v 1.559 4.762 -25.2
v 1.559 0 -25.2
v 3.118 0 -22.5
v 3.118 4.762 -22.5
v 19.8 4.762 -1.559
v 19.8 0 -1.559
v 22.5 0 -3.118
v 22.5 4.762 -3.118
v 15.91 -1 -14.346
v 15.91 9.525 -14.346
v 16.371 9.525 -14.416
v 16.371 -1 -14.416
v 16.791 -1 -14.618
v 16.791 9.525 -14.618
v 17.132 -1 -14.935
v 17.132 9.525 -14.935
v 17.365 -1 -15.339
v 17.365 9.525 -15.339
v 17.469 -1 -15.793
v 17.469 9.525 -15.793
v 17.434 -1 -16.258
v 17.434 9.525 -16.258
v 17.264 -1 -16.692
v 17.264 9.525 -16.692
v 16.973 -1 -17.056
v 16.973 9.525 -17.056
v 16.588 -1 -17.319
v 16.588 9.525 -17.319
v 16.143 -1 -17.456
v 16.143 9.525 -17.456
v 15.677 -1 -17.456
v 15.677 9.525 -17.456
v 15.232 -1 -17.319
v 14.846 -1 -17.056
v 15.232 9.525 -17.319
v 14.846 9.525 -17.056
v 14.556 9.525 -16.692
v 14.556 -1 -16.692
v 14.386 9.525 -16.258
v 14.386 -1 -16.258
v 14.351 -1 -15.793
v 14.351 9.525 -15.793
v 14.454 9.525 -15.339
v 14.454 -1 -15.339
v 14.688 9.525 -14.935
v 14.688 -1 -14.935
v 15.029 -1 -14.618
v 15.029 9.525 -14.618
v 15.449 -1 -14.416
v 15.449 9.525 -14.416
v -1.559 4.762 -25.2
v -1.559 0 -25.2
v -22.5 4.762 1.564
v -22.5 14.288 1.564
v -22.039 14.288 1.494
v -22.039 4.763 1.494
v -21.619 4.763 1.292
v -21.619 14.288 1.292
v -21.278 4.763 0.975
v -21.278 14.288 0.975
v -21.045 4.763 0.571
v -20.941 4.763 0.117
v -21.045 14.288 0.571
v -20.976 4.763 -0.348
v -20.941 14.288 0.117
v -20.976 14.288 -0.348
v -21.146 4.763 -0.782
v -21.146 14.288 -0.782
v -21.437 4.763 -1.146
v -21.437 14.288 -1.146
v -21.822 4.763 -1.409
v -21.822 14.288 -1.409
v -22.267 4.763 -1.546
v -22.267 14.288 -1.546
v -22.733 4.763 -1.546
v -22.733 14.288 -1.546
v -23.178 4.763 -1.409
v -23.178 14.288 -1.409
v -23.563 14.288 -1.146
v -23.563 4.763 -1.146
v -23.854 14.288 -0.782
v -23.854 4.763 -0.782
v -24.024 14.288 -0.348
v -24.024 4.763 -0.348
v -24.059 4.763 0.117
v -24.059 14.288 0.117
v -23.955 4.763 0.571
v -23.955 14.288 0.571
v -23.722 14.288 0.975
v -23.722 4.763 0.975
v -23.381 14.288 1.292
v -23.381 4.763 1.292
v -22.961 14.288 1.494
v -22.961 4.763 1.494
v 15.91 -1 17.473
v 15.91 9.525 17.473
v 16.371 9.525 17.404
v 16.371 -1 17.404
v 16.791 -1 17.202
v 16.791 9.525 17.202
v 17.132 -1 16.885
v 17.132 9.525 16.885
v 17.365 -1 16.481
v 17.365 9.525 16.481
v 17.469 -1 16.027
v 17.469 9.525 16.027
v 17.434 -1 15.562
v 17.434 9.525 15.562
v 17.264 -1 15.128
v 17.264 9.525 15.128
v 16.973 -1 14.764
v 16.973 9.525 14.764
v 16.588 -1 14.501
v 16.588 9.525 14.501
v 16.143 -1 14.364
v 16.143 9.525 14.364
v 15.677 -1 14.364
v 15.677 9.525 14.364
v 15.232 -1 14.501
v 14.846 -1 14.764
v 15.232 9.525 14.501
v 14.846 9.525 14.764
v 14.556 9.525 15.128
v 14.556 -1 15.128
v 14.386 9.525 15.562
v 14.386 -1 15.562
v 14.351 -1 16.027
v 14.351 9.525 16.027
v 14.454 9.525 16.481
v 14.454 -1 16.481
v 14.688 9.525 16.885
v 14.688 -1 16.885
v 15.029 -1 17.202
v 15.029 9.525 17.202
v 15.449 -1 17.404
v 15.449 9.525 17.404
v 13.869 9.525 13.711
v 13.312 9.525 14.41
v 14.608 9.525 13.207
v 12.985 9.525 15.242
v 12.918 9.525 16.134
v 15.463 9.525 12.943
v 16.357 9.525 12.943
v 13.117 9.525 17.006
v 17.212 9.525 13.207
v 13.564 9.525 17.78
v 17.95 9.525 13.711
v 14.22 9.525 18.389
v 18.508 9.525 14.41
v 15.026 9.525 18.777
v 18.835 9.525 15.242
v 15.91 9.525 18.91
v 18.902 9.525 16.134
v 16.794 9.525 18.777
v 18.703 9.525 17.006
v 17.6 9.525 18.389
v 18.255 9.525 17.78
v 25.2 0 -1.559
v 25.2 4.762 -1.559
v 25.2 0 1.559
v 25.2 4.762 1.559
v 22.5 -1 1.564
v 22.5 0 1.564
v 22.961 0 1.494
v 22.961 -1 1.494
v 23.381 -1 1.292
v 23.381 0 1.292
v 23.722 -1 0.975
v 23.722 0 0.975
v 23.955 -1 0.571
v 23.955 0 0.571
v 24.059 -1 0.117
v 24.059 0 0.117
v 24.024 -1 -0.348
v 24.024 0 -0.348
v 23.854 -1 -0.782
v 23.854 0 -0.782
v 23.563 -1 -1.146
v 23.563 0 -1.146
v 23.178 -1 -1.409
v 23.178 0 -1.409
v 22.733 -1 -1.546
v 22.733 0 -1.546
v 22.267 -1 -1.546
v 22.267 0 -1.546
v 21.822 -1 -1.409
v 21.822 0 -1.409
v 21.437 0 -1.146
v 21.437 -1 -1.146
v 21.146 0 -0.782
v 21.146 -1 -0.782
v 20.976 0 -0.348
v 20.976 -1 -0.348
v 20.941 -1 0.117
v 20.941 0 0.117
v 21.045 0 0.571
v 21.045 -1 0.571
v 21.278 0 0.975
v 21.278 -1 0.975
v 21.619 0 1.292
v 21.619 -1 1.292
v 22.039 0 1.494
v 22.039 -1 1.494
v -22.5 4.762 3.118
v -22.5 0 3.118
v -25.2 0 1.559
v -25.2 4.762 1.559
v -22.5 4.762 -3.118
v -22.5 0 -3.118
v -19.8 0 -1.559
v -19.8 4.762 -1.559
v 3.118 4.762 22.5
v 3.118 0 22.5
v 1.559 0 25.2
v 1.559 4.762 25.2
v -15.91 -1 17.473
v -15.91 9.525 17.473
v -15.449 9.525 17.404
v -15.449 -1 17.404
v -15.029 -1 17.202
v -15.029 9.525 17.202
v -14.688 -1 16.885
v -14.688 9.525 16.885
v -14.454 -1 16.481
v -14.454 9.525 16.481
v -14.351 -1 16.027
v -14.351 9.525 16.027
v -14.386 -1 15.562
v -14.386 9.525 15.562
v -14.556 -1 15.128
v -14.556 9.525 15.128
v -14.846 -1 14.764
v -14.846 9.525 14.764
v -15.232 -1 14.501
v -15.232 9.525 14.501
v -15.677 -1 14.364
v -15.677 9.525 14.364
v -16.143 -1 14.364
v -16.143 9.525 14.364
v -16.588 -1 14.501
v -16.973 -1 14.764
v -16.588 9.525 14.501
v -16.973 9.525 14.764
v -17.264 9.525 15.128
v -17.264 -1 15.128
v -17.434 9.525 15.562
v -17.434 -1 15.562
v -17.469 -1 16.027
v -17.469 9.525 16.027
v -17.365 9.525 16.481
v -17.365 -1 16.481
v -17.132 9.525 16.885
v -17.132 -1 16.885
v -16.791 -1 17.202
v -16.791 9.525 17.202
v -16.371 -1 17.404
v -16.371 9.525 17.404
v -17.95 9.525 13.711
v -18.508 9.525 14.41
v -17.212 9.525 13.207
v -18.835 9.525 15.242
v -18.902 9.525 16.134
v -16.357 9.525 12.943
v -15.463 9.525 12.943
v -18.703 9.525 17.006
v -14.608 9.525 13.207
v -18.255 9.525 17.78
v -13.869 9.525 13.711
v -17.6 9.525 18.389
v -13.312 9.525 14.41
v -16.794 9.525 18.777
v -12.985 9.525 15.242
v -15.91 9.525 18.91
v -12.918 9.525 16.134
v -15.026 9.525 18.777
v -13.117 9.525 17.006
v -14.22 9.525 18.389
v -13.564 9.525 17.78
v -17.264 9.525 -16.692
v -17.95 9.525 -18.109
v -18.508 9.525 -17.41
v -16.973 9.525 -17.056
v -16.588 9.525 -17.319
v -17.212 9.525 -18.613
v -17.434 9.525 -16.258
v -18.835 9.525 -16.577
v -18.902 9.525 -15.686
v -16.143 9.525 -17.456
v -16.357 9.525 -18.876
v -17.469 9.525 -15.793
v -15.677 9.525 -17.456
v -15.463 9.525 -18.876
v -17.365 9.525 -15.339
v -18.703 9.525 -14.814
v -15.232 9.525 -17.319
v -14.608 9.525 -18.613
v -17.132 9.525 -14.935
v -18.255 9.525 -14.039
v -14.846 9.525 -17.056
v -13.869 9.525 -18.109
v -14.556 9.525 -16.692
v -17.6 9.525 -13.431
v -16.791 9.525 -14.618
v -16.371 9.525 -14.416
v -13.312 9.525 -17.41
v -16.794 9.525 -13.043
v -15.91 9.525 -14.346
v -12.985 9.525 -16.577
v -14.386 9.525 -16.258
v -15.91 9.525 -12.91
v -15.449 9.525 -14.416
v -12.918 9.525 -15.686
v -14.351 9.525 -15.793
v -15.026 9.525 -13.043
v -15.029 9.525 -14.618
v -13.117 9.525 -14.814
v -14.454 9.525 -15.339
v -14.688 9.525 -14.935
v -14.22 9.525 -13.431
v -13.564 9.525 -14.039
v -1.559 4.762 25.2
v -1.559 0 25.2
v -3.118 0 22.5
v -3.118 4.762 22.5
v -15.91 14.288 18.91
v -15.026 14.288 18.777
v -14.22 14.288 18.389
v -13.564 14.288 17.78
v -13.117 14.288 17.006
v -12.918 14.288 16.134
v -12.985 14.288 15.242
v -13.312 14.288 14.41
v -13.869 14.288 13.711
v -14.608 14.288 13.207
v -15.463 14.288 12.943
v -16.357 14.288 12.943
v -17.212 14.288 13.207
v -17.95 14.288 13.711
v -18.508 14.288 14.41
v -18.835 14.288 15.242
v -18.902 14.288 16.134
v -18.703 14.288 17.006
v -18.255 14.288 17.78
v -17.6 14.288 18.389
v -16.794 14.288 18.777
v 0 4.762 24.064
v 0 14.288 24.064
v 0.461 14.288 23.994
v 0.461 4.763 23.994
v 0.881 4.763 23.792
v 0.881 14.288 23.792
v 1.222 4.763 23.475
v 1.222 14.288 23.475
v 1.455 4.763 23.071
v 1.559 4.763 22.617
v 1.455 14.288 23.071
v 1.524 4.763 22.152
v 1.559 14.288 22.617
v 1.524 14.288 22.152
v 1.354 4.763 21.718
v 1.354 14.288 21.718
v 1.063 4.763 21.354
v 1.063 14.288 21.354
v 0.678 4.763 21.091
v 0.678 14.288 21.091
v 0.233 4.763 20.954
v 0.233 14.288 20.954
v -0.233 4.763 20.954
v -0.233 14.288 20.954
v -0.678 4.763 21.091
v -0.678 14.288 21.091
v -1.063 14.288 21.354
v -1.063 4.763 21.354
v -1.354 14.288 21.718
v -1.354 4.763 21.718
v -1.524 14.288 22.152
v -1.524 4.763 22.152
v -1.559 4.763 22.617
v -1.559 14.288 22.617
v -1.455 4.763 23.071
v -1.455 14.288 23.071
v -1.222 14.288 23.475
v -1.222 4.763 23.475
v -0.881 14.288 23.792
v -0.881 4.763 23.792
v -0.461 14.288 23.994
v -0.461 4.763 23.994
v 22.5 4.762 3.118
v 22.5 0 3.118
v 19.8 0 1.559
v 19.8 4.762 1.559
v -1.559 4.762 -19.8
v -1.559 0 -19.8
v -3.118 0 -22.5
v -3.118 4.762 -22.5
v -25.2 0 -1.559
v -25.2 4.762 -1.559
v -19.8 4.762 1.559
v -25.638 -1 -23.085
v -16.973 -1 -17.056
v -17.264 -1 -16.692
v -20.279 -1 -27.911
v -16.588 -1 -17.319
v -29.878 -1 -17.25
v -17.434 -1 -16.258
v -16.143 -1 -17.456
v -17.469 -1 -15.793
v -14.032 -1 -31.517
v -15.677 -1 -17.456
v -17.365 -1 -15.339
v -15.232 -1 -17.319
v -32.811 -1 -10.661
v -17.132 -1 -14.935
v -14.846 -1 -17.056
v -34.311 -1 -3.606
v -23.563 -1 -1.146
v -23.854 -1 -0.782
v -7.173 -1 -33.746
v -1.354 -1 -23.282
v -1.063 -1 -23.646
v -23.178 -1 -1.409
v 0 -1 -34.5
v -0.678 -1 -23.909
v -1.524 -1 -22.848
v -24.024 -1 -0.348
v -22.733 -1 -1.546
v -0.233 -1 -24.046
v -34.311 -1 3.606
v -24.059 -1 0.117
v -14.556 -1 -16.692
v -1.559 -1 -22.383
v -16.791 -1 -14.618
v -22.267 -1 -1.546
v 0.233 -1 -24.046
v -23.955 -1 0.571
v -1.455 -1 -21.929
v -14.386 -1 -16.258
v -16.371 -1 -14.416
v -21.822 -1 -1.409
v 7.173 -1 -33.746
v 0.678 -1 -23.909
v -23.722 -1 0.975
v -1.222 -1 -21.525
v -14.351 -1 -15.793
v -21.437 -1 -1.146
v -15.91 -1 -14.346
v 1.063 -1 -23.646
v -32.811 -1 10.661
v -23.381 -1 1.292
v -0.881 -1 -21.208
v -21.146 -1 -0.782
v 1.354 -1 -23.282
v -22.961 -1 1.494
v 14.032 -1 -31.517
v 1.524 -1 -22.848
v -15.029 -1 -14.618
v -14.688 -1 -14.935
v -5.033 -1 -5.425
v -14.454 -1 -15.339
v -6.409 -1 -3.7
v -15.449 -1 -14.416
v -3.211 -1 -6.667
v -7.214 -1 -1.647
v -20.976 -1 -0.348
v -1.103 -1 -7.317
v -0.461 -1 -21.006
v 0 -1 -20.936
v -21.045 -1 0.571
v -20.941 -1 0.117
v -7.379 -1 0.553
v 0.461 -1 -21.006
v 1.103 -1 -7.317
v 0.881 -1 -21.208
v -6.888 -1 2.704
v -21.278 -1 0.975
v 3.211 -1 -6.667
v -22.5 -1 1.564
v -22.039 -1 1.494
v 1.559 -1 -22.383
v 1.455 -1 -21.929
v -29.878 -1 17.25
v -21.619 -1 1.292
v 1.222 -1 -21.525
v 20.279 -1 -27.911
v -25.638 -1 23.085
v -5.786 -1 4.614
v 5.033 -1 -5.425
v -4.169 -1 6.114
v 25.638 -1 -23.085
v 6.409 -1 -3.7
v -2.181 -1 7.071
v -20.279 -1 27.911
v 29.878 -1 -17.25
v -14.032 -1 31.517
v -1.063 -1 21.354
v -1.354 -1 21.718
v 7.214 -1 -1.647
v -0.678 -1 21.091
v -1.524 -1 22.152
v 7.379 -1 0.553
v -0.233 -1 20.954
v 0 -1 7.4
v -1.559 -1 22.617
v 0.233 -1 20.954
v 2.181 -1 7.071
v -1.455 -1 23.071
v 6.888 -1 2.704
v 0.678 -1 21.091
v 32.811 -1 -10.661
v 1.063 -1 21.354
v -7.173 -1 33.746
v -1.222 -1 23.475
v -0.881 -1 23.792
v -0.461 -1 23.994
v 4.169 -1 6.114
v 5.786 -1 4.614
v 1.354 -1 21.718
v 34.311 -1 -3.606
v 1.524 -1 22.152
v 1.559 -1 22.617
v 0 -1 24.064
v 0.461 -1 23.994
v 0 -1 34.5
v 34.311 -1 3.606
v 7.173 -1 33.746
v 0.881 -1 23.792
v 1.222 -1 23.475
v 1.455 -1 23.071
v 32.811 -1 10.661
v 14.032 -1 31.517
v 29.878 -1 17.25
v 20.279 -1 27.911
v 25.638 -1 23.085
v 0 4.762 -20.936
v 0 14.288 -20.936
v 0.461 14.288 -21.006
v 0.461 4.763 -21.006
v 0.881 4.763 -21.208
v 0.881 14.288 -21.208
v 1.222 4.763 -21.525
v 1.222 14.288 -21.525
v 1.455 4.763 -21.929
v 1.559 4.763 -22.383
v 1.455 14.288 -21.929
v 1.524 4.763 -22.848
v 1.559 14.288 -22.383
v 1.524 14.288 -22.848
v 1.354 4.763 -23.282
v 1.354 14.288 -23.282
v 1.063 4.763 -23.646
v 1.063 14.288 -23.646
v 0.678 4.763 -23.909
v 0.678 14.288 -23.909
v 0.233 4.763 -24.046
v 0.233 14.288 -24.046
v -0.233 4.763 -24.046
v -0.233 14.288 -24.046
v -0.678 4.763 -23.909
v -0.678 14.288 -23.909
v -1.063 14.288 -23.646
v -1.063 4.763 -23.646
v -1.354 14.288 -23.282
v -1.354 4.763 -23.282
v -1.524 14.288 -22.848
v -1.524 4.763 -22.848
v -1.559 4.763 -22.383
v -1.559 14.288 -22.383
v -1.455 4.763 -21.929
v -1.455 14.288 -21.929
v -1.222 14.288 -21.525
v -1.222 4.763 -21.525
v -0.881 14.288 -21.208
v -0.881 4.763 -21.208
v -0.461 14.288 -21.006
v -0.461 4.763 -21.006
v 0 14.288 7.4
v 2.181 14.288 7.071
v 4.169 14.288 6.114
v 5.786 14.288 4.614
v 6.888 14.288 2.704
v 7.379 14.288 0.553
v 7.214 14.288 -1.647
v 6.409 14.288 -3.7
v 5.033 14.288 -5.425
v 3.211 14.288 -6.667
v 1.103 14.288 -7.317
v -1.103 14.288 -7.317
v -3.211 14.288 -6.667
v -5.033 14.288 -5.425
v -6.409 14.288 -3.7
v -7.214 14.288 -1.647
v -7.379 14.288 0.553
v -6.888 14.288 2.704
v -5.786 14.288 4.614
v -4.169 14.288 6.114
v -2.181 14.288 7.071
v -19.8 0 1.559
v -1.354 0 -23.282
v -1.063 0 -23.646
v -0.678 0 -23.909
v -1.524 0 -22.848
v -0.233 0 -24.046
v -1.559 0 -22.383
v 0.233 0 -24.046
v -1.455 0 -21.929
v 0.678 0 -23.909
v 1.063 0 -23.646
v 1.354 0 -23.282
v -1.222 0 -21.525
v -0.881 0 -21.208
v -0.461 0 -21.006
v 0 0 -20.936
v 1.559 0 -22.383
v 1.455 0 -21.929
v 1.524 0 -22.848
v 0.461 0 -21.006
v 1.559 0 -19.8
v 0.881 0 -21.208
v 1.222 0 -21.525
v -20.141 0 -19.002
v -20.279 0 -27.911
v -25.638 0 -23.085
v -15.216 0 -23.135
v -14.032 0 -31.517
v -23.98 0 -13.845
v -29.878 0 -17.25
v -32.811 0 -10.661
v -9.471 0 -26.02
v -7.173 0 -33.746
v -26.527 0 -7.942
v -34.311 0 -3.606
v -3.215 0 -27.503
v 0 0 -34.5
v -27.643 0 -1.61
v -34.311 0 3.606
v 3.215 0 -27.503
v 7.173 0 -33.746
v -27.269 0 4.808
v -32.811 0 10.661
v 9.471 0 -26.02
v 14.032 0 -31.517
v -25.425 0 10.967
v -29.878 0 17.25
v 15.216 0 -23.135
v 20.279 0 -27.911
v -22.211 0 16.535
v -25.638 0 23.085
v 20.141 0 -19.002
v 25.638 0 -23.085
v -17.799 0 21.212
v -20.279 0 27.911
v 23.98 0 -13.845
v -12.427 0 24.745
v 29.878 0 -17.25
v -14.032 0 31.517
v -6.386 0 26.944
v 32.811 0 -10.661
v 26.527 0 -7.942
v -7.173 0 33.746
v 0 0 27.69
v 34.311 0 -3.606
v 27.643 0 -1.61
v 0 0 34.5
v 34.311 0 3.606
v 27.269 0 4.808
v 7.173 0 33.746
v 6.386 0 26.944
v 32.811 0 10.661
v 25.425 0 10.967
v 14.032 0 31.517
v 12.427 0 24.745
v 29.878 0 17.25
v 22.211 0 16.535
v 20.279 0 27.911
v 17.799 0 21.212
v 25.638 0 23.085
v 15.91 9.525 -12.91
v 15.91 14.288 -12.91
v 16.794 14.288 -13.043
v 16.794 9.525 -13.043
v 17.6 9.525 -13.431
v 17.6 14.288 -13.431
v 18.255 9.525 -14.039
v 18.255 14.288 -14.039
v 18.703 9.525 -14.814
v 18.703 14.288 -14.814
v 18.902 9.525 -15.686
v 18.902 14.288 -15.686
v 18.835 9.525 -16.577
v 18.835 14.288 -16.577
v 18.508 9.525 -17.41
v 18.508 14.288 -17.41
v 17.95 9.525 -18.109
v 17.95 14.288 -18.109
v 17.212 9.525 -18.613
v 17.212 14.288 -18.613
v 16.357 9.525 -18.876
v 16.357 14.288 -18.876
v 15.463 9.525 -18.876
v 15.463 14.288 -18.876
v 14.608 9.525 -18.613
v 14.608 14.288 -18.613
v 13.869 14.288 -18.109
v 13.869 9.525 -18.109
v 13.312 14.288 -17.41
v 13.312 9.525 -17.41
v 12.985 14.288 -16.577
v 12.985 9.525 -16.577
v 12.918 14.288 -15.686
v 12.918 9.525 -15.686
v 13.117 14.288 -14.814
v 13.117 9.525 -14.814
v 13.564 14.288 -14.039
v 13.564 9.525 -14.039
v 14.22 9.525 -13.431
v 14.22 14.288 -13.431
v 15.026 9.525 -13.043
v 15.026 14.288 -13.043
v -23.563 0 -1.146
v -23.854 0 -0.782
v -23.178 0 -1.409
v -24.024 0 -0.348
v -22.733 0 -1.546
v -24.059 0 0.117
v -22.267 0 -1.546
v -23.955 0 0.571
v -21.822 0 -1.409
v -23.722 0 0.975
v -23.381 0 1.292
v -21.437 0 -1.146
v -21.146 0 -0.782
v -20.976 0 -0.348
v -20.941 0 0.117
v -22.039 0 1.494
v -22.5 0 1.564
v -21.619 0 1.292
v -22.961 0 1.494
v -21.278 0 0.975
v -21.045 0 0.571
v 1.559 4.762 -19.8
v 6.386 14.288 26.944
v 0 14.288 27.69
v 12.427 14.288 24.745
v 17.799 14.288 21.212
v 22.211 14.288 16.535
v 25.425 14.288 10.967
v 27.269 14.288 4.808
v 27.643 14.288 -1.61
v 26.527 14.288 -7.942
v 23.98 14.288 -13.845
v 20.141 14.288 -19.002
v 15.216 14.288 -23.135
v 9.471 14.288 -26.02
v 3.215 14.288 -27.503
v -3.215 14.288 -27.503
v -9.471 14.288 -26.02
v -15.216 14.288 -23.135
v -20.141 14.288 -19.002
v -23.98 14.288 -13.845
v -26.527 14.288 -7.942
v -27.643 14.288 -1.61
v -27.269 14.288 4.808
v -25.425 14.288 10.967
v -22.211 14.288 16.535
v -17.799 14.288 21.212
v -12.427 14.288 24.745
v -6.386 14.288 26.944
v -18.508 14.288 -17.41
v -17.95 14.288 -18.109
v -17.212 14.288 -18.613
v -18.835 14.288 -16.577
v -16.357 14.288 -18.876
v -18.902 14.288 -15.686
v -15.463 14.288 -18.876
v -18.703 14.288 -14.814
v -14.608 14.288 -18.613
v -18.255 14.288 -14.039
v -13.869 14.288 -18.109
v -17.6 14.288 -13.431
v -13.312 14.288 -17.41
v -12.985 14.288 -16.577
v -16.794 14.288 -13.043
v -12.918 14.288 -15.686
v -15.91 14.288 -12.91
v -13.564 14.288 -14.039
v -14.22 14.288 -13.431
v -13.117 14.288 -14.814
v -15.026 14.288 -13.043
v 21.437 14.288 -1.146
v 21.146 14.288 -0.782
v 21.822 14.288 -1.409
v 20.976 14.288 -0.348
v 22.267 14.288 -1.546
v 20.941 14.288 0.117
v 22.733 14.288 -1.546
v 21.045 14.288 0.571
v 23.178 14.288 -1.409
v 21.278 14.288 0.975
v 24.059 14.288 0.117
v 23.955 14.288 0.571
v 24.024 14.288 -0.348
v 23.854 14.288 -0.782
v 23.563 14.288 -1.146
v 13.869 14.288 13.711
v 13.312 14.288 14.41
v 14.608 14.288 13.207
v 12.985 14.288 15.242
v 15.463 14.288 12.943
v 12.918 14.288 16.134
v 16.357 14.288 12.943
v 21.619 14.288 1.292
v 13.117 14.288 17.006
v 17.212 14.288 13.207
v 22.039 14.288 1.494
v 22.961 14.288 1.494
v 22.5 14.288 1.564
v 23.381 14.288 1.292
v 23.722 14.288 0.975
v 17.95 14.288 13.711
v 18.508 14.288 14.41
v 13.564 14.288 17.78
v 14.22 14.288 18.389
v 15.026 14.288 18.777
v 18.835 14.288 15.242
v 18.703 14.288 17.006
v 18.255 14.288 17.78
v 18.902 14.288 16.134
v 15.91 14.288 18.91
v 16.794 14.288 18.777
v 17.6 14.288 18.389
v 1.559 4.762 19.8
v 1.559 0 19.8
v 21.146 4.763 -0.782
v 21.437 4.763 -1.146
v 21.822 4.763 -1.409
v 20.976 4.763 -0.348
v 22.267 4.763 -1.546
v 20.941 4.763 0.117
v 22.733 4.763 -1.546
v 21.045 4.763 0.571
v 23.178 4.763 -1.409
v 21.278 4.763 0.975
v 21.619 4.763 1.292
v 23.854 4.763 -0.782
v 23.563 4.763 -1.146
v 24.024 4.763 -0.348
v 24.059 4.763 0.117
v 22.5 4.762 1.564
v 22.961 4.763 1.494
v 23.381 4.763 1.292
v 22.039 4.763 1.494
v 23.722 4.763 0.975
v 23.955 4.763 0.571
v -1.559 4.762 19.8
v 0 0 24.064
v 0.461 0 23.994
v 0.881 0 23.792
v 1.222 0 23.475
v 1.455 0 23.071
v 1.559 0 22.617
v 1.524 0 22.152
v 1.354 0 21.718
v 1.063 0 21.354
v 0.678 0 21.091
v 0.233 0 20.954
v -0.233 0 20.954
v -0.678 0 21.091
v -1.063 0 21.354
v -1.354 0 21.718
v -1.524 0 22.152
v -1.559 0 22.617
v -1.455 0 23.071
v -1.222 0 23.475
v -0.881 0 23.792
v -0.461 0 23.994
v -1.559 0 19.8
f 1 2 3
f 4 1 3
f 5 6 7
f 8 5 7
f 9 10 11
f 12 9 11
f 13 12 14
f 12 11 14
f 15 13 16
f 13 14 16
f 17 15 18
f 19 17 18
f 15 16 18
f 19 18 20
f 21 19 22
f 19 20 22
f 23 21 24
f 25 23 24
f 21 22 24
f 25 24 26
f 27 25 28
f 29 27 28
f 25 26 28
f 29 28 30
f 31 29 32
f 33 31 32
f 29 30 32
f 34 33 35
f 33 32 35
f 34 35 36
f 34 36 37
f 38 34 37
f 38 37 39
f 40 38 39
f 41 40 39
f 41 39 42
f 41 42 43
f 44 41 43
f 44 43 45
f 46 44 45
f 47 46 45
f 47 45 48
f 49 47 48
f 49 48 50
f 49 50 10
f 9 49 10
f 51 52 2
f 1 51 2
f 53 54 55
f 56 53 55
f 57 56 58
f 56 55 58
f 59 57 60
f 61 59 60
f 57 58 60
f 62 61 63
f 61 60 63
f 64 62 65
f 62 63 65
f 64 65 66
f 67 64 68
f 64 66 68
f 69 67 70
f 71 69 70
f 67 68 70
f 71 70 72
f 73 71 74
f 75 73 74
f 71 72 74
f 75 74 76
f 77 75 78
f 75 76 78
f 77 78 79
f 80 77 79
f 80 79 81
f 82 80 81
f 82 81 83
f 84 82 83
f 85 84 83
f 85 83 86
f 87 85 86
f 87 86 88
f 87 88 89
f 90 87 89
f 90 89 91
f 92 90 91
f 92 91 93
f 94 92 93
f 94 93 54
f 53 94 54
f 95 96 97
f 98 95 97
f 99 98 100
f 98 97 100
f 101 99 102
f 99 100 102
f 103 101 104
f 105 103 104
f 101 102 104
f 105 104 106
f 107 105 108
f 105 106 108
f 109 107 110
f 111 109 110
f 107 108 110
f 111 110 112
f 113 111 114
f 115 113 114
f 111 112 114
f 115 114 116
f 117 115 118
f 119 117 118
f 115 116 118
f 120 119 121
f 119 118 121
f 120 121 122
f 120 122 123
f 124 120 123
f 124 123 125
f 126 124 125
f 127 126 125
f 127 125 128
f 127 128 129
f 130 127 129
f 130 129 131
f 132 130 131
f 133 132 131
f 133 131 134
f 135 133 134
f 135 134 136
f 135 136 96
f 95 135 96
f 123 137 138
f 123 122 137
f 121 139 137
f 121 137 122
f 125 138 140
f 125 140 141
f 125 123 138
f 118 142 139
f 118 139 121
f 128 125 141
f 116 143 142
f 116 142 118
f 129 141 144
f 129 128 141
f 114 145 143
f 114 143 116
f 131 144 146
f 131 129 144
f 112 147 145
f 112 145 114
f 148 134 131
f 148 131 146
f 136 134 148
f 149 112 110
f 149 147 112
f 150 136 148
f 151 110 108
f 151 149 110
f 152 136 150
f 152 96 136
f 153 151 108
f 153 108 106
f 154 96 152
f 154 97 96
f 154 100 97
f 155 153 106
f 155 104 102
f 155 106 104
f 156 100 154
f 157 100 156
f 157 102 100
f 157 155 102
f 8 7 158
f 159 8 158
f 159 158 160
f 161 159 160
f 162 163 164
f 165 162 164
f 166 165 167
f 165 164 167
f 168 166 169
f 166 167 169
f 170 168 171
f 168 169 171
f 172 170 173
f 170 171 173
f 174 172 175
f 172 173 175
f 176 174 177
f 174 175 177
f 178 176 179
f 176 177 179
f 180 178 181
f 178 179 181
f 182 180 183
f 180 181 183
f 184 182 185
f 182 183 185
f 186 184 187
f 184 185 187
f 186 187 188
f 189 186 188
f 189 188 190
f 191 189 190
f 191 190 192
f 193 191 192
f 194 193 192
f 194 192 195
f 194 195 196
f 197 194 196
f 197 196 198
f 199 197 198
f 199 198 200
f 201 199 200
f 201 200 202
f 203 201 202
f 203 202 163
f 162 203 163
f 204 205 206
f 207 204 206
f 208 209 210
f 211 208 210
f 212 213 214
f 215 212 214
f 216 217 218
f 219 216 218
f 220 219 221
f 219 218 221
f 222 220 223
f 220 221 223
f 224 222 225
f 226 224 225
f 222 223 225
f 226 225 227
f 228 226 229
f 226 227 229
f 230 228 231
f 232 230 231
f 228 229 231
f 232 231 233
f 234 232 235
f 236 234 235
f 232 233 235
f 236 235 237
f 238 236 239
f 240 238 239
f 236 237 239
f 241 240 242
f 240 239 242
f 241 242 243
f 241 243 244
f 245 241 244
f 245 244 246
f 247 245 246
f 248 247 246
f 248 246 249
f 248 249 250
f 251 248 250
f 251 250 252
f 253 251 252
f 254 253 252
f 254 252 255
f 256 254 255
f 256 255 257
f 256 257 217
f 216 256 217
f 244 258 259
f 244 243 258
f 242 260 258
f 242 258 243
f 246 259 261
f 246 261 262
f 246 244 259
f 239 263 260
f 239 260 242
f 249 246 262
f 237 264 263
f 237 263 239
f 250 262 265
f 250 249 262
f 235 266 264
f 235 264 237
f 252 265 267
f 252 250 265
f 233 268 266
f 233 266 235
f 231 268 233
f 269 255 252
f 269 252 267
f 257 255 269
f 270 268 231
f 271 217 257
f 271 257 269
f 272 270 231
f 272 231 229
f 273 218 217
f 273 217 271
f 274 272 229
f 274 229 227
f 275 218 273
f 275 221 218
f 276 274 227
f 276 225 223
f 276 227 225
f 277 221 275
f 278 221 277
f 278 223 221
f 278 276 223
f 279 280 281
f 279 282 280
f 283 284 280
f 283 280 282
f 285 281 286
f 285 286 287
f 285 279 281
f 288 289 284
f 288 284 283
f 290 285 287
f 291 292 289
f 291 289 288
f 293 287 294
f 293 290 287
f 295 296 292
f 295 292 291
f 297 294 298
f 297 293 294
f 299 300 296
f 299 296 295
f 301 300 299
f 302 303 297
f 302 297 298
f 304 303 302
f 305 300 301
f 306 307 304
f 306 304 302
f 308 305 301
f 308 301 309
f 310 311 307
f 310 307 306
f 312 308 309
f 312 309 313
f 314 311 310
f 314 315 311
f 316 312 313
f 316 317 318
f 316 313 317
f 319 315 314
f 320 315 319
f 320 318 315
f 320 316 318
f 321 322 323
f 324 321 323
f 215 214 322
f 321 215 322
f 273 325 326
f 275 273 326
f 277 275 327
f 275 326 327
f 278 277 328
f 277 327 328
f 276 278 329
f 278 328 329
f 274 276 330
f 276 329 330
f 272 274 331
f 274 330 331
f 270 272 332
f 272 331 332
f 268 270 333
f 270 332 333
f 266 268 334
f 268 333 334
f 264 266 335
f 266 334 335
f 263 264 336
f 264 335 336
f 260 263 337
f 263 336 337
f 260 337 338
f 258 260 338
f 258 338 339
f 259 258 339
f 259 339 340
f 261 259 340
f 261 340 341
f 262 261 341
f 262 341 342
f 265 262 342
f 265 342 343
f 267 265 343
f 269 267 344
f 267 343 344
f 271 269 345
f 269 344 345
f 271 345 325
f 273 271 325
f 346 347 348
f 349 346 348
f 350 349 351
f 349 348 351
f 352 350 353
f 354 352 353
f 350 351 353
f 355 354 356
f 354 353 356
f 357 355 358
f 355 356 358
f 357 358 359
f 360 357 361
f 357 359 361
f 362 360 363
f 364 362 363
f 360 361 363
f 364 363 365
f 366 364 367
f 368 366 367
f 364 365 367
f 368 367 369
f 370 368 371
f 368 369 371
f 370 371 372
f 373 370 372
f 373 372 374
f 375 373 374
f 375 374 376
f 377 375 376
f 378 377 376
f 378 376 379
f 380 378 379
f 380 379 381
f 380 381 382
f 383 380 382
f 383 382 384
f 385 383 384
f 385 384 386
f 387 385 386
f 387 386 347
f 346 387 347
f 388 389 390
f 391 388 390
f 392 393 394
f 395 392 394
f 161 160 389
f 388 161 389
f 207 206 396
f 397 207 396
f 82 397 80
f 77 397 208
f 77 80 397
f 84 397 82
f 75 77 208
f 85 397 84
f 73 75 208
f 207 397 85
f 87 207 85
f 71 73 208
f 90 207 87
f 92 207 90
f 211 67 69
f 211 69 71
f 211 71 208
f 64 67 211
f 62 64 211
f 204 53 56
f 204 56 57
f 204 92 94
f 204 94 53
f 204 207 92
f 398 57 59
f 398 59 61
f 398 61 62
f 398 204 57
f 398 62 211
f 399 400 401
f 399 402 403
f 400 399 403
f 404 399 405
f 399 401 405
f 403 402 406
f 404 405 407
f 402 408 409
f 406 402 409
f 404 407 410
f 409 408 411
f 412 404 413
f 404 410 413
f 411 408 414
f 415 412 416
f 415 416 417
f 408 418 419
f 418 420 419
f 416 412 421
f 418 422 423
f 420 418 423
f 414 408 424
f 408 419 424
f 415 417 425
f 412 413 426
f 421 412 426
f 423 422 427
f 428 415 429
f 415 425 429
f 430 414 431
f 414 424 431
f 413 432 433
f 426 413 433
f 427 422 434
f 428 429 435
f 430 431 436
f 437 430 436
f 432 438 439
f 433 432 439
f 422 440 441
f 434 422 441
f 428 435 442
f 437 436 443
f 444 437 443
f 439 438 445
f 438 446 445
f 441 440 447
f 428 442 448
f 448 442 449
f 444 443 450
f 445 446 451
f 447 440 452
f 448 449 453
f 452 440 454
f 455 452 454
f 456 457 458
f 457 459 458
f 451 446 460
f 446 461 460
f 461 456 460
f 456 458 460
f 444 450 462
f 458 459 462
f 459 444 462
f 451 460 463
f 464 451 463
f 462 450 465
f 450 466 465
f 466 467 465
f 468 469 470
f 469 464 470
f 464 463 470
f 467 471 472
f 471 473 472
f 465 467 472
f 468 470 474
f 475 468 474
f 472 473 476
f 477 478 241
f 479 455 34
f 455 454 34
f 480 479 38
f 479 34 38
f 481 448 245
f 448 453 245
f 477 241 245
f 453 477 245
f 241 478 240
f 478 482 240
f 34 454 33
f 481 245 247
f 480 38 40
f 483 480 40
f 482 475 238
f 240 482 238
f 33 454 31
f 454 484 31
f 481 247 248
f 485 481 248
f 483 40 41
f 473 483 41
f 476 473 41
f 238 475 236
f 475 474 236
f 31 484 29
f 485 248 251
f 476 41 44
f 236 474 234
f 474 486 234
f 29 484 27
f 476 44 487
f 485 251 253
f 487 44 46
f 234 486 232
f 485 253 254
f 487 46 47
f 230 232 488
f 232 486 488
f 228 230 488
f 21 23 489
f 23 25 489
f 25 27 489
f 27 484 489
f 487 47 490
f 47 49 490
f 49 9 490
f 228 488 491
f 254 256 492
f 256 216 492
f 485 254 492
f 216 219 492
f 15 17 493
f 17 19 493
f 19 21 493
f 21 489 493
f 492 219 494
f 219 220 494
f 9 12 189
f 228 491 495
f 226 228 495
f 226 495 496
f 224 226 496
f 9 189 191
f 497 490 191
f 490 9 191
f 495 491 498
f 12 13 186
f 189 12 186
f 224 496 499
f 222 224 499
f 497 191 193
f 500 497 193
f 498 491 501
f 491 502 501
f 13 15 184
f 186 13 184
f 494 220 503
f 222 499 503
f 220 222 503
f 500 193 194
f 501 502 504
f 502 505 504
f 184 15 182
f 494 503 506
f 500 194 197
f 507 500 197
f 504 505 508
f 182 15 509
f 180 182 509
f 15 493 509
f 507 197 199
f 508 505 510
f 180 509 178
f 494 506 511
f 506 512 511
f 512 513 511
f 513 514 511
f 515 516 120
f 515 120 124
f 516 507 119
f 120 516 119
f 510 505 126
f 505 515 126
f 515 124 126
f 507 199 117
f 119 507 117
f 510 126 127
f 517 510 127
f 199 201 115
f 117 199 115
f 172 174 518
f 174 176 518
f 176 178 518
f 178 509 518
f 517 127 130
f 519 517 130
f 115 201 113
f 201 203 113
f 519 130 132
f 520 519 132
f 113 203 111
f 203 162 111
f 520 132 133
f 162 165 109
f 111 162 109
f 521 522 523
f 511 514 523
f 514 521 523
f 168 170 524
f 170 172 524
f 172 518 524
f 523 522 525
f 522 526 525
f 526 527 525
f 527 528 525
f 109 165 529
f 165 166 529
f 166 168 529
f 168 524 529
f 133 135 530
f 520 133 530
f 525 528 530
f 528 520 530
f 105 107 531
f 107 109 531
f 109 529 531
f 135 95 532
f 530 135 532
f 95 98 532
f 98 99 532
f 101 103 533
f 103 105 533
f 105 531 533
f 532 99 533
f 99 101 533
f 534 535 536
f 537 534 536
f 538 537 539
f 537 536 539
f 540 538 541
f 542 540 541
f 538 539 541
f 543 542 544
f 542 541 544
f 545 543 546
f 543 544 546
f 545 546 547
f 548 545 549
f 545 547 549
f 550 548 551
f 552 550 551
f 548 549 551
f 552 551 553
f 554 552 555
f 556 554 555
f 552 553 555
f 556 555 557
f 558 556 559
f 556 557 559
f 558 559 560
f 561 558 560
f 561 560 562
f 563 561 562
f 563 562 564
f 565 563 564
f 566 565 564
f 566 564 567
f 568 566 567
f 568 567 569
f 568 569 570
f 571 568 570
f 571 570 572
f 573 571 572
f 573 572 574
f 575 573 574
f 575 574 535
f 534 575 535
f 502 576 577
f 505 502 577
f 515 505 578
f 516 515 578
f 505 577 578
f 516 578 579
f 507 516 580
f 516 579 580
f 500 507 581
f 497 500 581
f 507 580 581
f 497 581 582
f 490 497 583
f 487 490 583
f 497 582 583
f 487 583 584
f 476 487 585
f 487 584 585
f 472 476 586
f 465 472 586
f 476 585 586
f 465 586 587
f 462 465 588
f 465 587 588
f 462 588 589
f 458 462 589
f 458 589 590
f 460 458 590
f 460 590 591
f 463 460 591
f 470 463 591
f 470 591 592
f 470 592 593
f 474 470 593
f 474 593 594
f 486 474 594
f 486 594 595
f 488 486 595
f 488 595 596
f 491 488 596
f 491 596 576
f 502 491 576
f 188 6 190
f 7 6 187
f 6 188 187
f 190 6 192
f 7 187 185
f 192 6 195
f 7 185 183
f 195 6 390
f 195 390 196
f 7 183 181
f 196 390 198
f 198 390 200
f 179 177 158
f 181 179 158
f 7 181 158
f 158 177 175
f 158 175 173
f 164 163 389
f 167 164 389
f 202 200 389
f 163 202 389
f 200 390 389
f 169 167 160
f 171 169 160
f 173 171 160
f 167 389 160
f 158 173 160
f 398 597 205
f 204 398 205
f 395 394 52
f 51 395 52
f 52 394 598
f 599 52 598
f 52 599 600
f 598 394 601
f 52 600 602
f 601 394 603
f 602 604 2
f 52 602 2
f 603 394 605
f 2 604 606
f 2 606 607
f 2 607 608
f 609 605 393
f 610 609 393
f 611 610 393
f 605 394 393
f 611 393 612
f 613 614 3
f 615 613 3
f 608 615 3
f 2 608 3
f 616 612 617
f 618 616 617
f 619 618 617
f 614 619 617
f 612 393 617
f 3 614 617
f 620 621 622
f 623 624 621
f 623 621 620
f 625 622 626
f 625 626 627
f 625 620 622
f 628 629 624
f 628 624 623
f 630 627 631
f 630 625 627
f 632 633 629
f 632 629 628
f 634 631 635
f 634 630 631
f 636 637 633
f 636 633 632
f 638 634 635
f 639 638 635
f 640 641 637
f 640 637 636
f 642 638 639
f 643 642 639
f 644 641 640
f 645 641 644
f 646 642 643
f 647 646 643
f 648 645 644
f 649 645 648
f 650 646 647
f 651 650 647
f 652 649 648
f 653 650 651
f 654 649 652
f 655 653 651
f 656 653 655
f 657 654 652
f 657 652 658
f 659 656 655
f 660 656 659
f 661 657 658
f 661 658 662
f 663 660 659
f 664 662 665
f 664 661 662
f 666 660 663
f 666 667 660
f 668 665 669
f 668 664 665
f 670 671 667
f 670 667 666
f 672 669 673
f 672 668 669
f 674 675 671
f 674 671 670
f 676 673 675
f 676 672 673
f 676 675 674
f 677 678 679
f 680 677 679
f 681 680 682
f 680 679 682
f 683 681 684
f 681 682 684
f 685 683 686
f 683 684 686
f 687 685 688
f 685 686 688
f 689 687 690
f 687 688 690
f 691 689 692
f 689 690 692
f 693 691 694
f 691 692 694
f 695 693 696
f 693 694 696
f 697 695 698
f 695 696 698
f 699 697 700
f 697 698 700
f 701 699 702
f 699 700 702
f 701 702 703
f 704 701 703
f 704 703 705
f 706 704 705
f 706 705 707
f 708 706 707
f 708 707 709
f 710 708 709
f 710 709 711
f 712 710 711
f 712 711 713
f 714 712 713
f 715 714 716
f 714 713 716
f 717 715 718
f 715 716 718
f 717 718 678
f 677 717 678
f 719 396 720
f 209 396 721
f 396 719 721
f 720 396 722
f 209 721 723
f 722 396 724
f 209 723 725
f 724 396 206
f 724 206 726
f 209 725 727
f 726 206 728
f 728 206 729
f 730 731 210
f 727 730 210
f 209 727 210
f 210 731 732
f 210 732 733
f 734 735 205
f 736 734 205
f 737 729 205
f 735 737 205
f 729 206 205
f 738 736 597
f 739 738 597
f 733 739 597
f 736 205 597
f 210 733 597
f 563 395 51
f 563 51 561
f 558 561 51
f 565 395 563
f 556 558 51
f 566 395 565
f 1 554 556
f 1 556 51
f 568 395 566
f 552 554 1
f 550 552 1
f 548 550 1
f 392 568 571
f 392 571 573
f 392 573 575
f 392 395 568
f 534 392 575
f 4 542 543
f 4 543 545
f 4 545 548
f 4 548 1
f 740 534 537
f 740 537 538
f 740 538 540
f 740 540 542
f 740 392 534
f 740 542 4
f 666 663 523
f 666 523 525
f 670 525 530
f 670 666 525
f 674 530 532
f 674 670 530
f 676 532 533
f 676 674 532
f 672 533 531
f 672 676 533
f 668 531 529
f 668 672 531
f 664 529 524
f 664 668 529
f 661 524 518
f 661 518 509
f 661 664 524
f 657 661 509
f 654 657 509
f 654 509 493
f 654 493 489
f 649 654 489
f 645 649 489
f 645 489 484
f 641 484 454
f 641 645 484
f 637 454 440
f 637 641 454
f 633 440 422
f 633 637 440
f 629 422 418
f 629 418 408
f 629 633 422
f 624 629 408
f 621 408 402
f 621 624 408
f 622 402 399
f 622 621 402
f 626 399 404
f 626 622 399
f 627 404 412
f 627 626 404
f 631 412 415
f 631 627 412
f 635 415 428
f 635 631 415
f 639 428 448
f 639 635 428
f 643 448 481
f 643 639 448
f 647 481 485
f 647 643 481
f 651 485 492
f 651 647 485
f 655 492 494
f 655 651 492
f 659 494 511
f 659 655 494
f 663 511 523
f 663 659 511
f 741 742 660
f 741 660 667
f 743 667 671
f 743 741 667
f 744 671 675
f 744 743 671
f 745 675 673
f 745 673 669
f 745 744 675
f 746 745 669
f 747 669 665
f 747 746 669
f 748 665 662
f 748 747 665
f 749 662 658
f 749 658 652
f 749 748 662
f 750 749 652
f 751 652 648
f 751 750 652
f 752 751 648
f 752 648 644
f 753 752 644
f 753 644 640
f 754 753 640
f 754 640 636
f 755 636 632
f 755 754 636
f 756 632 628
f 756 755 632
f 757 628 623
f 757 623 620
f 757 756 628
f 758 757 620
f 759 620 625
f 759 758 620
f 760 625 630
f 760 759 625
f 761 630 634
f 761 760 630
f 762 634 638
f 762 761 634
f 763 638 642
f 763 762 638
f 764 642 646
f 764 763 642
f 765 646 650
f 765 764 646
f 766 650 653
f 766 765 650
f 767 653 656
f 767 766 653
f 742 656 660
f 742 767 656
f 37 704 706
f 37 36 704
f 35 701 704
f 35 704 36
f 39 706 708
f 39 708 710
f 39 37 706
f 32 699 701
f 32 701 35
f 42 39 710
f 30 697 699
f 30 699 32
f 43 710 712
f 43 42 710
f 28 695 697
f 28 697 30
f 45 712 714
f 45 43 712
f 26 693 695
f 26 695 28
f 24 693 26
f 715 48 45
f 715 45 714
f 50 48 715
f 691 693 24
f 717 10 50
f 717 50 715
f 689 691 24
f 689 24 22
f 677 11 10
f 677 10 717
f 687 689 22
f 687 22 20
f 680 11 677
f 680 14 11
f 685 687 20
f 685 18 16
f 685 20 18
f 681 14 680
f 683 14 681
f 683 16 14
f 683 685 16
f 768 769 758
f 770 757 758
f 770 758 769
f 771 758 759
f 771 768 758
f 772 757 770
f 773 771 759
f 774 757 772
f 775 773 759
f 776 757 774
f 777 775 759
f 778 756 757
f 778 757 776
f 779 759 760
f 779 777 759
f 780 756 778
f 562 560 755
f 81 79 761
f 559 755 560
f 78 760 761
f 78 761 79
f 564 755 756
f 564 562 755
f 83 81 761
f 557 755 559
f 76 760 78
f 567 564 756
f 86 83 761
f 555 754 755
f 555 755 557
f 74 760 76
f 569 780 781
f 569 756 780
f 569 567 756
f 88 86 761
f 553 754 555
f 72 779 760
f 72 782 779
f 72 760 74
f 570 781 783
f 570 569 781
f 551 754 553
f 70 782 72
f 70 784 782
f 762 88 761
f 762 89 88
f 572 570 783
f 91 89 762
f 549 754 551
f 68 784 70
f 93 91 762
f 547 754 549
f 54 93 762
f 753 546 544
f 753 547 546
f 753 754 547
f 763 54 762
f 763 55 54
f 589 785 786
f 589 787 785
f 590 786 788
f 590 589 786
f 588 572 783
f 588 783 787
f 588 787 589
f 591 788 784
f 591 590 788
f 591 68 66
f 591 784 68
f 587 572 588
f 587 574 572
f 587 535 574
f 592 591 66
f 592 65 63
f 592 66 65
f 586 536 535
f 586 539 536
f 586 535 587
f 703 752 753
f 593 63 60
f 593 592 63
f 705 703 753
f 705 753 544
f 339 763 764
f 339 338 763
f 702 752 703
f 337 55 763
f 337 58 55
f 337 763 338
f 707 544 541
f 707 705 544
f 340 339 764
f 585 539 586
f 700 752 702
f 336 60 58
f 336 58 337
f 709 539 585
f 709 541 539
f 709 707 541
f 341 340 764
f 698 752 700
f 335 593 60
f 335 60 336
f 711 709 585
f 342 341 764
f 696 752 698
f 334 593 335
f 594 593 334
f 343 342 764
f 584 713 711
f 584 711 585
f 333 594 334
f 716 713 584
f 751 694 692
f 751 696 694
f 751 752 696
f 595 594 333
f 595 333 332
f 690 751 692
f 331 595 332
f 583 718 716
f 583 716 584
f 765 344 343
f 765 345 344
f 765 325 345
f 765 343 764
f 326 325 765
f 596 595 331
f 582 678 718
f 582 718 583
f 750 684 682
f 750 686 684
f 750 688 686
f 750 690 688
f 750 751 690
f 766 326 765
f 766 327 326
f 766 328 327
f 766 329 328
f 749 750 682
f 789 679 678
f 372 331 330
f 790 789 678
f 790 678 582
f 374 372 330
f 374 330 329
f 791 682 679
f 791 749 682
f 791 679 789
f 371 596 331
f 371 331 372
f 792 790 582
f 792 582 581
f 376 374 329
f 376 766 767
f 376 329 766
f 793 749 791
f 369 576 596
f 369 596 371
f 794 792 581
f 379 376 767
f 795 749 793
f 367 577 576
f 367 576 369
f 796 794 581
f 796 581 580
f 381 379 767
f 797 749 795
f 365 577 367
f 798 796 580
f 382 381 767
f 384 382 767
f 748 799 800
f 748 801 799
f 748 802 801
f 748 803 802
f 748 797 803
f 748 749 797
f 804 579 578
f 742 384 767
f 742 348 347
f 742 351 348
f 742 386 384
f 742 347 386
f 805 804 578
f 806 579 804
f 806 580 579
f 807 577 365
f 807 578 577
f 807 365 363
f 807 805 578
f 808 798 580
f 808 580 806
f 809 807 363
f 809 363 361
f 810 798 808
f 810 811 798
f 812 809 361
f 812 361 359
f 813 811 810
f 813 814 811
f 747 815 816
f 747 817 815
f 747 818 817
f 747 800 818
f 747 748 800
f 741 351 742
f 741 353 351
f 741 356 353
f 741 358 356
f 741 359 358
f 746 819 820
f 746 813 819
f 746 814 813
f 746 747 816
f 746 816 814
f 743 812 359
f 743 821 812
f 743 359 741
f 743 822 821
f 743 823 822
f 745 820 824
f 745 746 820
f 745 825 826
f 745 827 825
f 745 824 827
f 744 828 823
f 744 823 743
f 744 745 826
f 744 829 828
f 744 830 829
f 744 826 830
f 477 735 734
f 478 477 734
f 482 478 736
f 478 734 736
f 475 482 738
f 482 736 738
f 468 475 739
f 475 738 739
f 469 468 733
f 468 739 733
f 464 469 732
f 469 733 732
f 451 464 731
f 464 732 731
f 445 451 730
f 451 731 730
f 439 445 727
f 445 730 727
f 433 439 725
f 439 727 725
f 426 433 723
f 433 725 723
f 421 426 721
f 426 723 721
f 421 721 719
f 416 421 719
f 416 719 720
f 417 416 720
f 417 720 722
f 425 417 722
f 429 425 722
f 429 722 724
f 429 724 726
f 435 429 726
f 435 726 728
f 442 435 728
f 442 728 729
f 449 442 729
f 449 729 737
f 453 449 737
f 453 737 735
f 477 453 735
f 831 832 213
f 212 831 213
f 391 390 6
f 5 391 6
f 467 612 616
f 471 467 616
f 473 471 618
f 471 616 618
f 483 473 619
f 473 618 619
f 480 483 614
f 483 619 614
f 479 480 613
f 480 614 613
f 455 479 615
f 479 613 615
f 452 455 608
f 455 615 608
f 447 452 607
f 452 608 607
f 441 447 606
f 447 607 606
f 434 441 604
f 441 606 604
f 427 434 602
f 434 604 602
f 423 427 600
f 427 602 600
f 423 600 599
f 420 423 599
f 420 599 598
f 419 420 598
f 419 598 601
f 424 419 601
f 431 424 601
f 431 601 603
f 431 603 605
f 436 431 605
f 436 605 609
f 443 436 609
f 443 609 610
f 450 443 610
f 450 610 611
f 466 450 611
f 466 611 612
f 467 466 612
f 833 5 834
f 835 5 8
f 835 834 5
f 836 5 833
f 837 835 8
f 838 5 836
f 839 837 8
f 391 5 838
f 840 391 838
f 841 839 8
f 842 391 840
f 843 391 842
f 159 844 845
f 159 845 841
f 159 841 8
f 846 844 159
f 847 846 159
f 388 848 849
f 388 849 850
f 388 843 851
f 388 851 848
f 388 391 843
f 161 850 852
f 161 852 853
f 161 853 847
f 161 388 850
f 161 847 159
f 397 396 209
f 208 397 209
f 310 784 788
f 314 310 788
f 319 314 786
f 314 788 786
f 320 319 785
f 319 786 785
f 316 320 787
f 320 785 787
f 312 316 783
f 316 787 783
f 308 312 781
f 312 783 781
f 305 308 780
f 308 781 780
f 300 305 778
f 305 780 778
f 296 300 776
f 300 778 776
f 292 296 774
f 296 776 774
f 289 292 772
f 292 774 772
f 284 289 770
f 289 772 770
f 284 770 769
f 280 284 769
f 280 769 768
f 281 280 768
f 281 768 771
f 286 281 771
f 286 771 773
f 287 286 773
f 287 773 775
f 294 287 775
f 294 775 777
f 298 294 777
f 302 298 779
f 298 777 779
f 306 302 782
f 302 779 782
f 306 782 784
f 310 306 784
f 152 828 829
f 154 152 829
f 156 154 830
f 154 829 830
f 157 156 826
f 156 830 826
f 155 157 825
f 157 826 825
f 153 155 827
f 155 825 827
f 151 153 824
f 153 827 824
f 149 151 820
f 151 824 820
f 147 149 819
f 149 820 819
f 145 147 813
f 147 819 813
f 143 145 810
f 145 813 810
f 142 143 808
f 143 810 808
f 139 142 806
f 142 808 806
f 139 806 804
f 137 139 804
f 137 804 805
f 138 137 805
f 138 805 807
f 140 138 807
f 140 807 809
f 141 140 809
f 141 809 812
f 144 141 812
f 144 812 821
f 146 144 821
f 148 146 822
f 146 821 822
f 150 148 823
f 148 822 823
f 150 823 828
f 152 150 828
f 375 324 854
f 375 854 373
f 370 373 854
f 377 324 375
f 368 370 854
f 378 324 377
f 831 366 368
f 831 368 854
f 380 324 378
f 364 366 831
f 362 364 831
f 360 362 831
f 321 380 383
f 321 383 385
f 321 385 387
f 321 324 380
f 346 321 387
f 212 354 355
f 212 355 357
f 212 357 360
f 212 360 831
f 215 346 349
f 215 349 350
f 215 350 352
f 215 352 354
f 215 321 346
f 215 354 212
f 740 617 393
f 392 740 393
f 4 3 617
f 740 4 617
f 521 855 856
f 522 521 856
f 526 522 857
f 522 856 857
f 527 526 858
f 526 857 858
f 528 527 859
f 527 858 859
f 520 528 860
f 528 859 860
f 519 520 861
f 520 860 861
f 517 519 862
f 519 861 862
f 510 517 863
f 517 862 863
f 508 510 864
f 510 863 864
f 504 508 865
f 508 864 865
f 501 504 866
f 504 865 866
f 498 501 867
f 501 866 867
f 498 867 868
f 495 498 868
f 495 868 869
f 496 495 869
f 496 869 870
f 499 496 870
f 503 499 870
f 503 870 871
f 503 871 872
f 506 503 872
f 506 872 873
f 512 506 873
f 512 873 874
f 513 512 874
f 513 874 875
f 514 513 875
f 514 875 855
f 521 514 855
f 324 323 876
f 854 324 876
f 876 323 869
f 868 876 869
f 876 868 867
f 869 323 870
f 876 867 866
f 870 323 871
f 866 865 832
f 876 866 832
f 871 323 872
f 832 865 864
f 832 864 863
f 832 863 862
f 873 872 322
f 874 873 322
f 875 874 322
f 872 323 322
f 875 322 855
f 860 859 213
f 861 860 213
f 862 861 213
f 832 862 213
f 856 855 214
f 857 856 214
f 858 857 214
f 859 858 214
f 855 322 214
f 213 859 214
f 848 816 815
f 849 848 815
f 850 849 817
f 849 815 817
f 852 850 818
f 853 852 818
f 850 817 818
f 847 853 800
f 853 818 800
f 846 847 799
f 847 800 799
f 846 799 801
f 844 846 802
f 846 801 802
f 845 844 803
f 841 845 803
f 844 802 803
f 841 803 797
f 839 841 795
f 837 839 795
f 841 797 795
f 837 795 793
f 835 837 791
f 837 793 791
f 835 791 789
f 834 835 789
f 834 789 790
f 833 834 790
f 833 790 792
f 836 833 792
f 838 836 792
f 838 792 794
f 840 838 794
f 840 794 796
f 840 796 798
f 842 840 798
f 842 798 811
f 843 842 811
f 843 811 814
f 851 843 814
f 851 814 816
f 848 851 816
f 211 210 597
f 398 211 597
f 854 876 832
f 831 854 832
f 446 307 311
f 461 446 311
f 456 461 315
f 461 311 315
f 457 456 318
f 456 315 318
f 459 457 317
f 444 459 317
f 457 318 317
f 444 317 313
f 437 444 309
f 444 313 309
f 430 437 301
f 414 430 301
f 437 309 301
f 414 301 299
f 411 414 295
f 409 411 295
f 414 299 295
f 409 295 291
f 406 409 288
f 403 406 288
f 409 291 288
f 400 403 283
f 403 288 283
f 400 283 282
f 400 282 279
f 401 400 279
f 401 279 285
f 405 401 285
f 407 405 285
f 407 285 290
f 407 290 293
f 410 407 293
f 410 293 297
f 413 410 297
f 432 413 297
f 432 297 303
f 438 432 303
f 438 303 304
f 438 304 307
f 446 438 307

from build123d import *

# Parameters (mm, degrees)
SKETCH1_R           = 34.5
SKETCH1_R_2         = 1.5635
SKETCH1_R_3         = 7.4
BOSS_EXTRUDE1_DEPTH = 1
BOSS_EXTRUDE2_START = 14.2875
SKETCH1_3_R         = 27.69
SKETCH1_3_R_2       = 7.4
SKETCH1_3_R_3       = 1.5635
BOSS_EXTRUDE2_DEPTH = 14.2875
SKETCH2_R           = 3
SKETCH2_R_2         = 1.5635
CUT_EXTRUDE1_DEPTH  = 4.7625
CUT_EXTRUDE4_START  = -1
CUT_EXTRUDE4_DEPTH  = 4.7625


with BuildPart() as part:
    # Sketch1 → Boss-Extrude1 (new body)
    with BuildSketch(Plane(origin=(0, 0, 0), x_dir=(1, 0, 0), z_dir=(0, 1, 0))):
        Circle(SKETCH1_R)
        with Locations((22.5, 0)):
            Circle(SKETCH1_R_2, mode=Mode.SUBTRACT)
        with Locations((-15.909902577, -15.909902577)):
            Circle(SKETCH1_R_2, mode=Mode.SUBTRACT)
        with Locations((0, -22.5)):
            Circle(SKETCH1_R_2, mode=Mode.SUBTRACT)
        with Locations((15.909902577, -15.909902577)):
            Circle(SKETCH1_R_2, mode=Mode.SUBTRACT)
        with Locations((-22.5, 0)):
            Circle(SKETCH1_R_2, mode=Mode.SUBTRACT)
        with Locations((-15.909902577, 15.909902577)):
            Circle(SKETCH1_R_2, mode=Mode.SUBTRACT)
        with Locations((0, 22.5)):
            Circle(SKETCH1_R_2, mode=Mode.SUBTRACT)
        with Locations((15.909902577, 15.909902577)):
            Circle(SKETCH1_R_2, mode=Mode.SUBTRACT)
        Circle(SKETCH1_R_3, mode=Mode.SUBTRACT)
    extrude(amount=-BOSS_EXTRUDE1_DEPTH)

    # Sketch1<3> → Boss-Extrude2 (add)
    with BuildSketch(Plane(origin=(0, 0, 0), x_dir=(1, 0, 0), z_dir=(0, 1, 0)).offset(BOSS_EXTRUDE2_START)):
        Circle(SKETCH1_3_R)
        Circle(SKETCH1_3_R_2, mode=Mode.SUBTRACT)
        with Locations((-15.909902577, -15.909902577)):
            Circle(SKETCH1_3_R_3, mode=Mode.SUBTRACT)
        with Locations((0, -22.5)):
            Circle(SKETCH1_3_R_3, mode=Mode.SUBTRACT)
        with Locations((15.909902577, -15.909902577)):
            Circle(SKETCH1_3_R_3, mode=Mode.SUBTRACT)
        with Locations((-22.5, 0)):
            Circle(SKETCH1_3_R_3, mode=Mode.SUBTRACT)
        with Locations((-15.909902577, 15.909902577)):
            Circle(SKETCH1_3_R_3, mode=Mode.SUBTRACT)
        with Locations((0, 22.5)):
            Circle(SKETCH1_3_R_3, mode=Mode.SUBTRACT)
        with Locations((22.5, 0)):
            Circle(SKETCH1_3_R_3, mode=Mode.SUBTRACT)
        with Locations((15.909902577, 15.909902577)):
            Circle(SKETCH1_3_R_3, mode=Mode.SUBTRACT)
    extrude(amount=-BOSS_EXTRUDE2_DEPTH)

    # Sketch2 → Cut-Extrude1 (cut)
    # profile 1 of 4: a face of its own
    with BuildSketch(Plane(origin=(0, 14.2875, 0), x_dir=(1, 0, 0), z_dir=(0, 1, 0))):
        with Locations((15.909902577, 15.909902577)):
            Circle(SKETCH2_R)
        with Locations((15.909902577, 15.909902577)):
            Circle(SKETCH2_R_2, mode=Mode.SUBTRACT)
    # profile 2 of 4: a face of its own
    with BuildSketch(Plane(origin=(0, 14.2875, 0), x_dir=(1, 0, 0), z_dir=(0, 1, 0))):
        with Locations((15.909902577, -15.909902577)):
            Circle(SKETCH2_R)
    # profile 3 of 4: a face of its own
    with BuildSketch(Plane(origin=(0, 14.2875, 0), x_dir=(1, 0, 0), z_dir=(0, 1, 0))):
        with Locations((-15.909902577, -15.909902577)):
            Circle(SKETCH2_R)
        with Locations((-15.909902577, -15.909902577)):
            Circle(SKETCH2_R_2, mode=Mode.SUBTRACT)
    # profile 4 of 4: a face of its own
    with BuildSketch(Plane(origin=(0, 14.2875, 0), x_dir=(1, 0, 0), z_dir=(0, 1, 0))):
        with Locations((-15.909902577, 15.909902577)):
            Circle(SKETCH2_R)
        with Locations((-15.909902577, 15.909902577)):
            Circle(SKETCH2_R_2, mode=Mode.SUBTRACT)
    extrude(amount=-CUT_EXTRUDE1_DEPTH, mode=Mode.SUBTRACT)

    # Sketch4 → Cut-Extrude4 (cut)
    with BuildSketch(Plane.XZ.offset(1).offset(CUT_EXTRUDE4_START)):
        Polygon((22.5, 3.117691454), (19.8, 1.558845727), (19.8, -1.558845727), (22.5, -3.117691454), (25.2, -1.558845727), (25.2, 1.558845727), align=None)
        Polygon((1.558845727, 25.2), (-1.558845727, 25.2), (-3.117691454, 22.5), (-1.558845727, 19.8), (1.558845727, 19.8), (3.117691454, 22.5), align=None)
        Polygon((3.117691454, -22.5), (1.558845727, -19.8), (-1.558845727, -19.8), (-3.117691454, -22.5), (-1.558845727, -25.2), (1.558845727, -25.2), align=None)
        Polygon((-22.5, -3.117691454), (-19.8, -1.558845727), (-19.8, 1.558845727), (-22.5, 3.117691454), (-25.2, 1.558845727), (-25.2, -1.558845727), align=None)
    extrude(amount=-CUT_EXTRUDE4_DEPTH, mode=Mode.SUBTRACT)


solid = part.part
